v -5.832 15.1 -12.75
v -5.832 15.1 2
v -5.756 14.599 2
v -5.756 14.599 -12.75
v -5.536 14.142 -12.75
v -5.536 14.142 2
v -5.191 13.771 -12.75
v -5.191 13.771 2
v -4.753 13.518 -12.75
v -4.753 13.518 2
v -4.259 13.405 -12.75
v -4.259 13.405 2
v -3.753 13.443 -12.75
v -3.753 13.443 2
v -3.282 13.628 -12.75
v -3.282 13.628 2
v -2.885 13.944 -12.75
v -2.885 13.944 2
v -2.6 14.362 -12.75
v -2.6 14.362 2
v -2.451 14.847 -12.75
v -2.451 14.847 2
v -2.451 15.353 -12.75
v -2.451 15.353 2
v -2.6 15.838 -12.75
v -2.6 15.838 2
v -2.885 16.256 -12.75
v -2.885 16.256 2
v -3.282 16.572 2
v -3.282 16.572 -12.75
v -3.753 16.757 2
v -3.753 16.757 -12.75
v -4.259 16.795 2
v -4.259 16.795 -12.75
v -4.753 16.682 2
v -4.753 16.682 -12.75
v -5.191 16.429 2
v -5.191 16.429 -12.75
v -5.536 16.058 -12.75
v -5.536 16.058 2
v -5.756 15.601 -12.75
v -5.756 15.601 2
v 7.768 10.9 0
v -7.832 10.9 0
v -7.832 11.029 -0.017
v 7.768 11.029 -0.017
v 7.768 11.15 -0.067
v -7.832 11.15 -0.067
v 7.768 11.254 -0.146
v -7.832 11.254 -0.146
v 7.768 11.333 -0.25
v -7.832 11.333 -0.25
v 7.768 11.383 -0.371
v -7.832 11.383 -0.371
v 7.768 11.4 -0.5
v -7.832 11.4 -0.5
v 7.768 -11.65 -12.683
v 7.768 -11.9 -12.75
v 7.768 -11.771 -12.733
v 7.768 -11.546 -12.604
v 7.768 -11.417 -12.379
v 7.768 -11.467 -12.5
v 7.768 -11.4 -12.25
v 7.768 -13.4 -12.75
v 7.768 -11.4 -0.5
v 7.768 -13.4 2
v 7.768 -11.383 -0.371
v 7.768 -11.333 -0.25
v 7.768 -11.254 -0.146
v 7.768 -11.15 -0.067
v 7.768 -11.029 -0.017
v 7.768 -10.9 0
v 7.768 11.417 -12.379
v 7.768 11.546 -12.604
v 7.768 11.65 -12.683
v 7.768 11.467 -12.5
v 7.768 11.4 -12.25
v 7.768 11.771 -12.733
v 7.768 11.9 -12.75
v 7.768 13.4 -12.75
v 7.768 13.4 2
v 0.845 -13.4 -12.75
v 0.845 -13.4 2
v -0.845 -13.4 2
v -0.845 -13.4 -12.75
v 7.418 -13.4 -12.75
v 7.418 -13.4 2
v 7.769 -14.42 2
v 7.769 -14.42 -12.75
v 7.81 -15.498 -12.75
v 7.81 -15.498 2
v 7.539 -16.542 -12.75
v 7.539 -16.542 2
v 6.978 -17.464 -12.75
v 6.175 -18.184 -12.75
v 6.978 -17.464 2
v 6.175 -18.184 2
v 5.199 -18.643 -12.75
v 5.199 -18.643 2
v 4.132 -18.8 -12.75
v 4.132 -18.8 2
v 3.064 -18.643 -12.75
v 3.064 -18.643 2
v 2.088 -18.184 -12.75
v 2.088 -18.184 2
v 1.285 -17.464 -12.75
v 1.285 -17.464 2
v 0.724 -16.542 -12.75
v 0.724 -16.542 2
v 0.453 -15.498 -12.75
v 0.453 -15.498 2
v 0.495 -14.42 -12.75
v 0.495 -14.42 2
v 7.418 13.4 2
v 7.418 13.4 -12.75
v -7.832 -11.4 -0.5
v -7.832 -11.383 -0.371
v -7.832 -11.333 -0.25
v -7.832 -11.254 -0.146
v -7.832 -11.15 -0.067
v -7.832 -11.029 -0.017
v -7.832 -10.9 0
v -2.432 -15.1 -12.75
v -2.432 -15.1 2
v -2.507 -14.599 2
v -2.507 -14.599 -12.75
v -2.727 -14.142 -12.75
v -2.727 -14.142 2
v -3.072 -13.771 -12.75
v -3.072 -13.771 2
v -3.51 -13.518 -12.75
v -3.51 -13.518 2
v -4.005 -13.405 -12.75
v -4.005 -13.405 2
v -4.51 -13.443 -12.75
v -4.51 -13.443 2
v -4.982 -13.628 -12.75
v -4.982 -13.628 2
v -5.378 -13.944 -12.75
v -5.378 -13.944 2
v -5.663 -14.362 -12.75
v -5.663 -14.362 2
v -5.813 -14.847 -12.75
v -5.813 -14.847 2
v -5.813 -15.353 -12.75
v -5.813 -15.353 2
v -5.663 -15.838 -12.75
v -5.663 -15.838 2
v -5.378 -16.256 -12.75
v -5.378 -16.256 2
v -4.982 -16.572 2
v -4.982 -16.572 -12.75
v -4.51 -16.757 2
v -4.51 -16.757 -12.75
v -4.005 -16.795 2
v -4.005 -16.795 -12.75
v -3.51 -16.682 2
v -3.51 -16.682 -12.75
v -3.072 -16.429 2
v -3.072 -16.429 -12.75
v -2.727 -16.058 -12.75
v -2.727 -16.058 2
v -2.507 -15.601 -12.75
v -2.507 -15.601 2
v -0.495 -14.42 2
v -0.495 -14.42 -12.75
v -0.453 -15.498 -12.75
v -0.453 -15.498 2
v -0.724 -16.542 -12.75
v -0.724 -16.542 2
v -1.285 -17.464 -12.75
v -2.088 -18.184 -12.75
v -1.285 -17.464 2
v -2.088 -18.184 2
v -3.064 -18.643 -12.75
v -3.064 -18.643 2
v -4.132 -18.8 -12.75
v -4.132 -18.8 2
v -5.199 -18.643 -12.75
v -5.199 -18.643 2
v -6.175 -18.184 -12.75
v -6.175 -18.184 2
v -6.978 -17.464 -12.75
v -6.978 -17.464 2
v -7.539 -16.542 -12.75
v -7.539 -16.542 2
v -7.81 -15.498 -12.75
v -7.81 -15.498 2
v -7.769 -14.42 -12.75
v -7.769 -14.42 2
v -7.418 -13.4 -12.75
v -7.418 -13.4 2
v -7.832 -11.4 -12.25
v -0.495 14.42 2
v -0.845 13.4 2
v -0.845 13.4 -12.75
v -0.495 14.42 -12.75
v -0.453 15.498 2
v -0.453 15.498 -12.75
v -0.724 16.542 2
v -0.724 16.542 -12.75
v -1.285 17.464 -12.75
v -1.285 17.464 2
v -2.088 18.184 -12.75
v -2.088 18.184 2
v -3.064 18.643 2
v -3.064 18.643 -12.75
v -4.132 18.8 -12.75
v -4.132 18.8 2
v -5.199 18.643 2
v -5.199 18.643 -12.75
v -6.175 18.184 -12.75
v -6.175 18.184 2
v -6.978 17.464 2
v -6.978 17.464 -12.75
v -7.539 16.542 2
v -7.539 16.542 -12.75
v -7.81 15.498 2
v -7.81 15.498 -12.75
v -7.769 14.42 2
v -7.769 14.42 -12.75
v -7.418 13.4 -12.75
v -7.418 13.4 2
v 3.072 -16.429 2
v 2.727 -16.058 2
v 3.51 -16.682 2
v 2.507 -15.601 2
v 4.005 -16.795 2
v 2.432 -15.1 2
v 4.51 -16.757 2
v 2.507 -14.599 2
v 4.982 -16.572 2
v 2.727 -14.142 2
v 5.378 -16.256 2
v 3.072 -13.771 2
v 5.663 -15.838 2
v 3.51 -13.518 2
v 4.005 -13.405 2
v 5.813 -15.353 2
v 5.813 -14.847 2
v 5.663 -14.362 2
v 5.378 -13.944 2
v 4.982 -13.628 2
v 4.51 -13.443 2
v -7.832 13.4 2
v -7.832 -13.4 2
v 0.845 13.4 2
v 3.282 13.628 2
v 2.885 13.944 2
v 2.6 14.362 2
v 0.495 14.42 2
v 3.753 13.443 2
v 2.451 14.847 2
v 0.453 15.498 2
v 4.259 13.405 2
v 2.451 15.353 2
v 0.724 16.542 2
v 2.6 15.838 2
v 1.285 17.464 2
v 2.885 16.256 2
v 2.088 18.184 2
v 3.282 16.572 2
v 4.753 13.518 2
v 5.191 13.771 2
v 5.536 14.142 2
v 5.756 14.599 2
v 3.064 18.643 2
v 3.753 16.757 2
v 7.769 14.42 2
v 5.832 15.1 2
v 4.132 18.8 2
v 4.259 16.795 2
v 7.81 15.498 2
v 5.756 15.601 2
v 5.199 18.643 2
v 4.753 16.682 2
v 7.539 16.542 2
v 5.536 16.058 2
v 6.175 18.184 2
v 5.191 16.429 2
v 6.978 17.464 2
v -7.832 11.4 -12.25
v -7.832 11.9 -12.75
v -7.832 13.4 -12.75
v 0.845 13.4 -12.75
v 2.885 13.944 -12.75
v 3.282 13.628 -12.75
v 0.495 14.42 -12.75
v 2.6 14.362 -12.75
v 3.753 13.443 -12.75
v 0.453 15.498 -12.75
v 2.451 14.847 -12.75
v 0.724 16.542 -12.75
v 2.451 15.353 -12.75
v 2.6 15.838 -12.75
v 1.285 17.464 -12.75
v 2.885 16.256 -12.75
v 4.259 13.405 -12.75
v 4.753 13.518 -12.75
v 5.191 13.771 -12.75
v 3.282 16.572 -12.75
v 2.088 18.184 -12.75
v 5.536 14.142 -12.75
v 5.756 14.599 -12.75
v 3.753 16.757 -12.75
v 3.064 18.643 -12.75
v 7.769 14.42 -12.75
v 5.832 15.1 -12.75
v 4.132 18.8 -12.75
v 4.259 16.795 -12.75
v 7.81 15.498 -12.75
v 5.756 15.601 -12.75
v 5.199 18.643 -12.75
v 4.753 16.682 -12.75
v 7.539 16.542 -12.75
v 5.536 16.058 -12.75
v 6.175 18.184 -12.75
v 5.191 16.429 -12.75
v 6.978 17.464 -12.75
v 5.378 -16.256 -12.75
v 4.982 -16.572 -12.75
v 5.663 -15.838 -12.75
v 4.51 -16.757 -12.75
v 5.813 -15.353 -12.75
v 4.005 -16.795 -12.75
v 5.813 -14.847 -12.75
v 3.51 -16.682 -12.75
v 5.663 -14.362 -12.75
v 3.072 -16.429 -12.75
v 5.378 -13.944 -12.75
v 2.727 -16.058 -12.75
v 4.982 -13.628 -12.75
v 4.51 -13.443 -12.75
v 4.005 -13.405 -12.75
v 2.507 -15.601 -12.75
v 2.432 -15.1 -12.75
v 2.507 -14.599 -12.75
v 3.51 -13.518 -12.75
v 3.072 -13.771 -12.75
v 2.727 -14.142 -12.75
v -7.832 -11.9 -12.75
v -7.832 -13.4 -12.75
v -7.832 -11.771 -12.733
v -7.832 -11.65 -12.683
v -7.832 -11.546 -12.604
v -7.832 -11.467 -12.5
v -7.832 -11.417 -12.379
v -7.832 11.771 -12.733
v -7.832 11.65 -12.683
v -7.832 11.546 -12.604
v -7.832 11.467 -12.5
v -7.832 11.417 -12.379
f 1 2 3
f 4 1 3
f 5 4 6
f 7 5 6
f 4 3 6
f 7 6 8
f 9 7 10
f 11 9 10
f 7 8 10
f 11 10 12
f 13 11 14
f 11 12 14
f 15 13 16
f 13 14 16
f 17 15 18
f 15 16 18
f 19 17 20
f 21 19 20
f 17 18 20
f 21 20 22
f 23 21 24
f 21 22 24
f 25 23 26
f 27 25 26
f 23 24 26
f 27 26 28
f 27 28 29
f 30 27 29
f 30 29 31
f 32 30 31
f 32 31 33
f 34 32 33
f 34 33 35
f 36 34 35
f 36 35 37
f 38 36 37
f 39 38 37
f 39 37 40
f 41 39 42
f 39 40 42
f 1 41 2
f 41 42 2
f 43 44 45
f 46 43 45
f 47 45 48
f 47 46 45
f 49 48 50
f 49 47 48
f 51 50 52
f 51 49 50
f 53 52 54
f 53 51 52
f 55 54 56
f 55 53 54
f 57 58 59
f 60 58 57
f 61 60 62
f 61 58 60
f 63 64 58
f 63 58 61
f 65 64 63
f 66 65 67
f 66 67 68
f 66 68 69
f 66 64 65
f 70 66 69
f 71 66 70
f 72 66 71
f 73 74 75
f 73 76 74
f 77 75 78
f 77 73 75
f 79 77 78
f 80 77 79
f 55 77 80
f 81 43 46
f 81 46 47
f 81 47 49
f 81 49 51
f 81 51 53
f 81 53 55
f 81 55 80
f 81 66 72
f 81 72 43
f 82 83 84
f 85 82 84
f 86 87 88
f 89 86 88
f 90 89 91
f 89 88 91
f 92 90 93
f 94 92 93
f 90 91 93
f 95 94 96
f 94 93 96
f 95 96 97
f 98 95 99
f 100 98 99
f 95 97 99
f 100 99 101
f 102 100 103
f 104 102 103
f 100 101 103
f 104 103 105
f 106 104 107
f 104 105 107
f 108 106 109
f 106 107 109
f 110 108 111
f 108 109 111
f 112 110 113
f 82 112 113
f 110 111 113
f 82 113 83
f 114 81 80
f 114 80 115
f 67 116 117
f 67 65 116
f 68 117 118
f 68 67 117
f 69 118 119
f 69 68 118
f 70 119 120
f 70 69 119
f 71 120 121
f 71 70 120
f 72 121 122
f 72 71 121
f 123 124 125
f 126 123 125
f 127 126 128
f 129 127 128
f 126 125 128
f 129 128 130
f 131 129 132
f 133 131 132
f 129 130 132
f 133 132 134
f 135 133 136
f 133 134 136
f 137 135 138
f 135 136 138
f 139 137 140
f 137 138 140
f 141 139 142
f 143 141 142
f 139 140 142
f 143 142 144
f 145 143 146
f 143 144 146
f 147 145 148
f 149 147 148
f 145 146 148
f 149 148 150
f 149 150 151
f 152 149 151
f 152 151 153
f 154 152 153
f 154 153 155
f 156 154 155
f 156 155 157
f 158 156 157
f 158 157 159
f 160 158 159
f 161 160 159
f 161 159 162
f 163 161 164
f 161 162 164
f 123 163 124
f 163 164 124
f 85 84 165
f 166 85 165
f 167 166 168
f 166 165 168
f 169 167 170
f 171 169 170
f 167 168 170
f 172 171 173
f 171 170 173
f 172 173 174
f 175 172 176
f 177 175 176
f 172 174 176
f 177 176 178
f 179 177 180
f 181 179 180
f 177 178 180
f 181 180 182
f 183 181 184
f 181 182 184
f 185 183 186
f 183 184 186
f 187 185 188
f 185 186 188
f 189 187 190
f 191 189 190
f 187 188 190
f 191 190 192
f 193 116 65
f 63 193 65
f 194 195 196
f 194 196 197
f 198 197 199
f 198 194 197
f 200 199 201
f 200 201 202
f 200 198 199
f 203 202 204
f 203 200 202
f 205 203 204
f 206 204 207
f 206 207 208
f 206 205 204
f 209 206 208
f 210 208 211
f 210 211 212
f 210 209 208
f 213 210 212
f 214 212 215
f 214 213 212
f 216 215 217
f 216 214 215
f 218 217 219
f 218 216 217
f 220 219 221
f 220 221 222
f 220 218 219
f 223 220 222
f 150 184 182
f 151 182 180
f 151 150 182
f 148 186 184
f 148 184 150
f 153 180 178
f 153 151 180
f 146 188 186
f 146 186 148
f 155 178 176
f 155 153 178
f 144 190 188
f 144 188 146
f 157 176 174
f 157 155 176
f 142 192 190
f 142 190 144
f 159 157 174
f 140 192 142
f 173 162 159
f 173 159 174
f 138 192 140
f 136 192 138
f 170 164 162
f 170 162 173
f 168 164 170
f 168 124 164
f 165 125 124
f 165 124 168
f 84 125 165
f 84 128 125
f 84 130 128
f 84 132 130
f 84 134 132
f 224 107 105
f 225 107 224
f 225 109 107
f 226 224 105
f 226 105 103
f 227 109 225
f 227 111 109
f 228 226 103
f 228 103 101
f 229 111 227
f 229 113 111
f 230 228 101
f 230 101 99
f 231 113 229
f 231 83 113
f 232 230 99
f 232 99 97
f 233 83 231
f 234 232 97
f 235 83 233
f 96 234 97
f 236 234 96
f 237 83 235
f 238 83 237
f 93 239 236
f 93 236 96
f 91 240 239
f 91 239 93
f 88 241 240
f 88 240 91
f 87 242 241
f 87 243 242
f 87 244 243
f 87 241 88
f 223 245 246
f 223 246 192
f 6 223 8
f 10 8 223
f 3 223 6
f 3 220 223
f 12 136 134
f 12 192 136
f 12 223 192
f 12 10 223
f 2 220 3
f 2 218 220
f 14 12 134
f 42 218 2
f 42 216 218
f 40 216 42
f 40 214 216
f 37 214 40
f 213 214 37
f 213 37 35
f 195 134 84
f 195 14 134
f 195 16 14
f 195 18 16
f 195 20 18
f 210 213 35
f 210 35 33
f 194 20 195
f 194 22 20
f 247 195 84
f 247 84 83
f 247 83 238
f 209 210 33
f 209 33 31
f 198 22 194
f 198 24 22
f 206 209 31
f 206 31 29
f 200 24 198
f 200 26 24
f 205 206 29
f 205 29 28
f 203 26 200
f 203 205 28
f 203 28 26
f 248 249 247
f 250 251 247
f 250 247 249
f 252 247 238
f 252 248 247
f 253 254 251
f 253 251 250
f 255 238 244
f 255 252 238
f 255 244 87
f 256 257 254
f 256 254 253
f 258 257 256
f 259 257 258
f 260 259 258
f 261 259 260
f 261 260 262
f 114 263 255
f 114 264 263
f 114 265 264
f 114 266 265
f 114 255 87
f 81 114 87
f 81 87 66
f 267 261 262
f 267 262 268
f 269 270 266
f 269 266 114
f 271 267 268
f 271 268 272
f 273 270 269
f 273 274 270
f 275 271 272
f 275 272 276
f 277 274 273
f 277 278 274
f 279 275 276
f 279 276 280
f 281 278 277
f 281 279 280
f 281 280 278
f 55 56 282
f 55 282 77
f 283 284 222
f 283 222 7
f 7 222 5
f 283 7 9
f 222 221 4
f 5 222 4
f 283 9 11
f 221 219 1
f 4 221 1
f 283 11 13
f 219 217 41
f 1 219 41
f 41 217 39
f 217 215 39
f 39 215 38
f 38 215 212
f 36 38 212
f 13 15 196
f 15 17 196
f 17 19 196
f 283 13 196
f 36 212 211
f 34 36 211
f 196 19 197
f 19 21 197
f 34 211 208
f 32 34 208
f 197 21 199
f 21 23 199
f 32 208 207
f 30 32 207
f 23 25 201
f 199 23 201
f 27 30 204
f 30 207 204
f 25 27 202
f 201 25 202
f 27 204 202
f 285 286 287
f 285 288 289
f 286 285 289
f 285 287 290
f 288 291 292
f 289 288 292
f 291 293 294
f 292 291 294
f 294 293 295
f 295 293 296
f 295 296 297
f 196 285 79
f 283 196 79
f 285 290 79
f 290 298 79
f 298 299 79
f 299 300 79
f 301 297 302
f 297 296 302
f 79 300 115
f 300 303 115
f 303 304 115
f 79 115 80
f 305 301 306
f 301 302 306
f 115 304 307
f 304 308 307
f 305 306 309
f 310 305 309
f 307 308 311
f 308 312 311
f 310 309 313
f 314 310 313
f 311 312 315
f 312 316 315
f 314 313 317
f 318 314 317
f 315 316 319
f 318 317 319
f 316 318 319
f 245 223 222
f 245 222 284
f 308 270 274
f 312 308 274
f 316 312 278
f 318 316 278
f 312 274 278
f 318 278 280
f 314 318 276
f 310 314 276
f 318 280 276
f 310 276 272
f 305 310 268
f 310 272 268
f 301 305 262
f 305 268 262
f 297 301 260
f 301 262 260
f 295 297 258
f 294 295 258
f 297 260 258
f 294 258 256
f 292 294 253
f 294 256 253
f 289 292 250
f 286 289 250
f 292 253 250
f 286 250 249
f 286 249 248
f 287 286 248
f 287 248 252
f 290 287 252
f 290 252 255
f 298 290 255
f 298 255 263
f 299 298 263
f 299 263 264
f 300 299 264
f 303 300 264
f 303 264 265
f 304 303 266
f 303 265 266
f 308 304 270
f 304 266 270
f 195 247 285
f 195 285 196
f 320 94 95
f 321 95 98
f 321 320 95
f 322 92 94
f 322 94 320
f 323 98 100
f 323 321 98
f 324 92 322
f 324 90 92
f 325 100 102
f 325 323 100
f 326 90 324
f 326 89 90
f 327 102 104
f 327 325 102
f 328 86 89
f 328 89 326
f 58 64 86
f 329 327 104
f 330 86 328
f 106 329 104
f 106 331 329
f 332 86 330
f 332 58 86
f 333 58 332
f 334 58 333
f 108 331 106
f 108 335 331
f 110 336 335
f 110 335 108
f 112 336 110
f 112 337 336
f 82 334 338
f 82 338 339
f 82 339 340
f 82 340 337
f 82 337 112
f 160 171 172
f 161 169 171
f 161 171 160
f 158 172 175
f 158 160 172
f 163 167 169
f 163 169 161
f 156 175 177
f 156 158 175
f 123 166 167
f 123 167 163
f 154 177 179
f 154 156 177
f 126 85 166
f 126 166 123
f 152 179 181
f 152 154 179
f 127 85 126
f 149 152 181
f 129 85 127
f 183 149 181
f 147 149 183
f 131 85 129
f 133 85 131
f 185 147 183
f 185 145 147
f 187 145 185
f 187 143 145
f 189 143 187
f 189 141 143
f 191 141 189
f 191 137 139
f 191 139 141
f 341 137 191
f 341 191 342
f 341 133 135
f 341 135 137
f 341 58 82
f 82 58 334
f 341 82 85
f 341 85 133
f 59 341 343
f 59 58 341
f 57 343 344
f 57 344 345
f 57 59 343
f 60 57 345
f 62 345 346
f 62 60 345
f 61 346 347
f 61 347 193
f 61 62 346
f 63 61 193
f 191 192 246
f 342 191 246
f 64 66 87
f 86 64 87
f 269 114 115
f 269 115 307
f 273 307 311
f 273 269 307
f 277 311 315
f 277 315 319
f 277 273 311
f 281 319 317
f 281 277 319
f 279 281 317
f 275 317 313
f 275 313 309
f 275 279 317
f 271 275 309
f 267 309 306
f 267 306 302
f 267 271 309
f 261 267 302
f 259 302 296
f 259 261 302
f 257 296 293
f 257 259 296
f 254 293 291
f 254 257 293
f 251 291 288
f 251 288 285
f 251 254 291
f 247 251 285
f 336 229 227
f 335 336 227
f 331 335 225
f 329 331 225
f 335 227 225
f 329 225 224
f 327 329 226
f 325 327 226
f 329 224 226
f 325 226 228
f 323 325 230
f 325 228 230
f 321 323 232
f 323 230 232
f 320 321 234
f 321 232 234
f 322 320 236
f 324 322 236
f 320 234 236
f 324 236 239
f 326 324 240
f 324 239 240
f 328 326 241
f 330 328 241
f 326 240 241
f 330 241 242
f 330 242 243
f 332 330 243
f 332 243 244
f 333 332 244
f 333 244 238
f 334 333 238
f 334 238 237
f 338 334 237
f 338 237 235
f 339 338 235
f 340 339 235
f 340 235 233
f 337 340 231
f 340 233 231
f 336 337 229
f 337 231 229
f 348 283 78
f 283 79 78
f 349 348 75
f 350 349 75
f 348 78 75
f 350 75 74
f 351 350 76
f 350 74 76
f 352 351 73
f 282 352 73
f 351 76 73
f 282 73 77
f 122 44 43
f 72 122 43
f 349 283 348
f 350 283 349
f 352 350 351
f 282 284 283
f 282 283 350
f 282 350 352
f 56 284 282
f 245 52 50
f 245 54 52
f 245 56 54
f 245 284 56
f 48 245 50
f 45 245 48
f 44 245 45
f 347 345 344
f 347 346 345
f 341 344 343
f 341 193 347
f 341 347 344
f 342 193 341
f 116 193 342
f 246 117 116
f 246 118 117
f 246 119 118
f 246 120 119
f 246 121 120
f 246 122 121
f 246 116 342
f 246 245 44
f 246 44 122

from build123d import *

# Parameters (mm, degrees)
SCHIZZO1_W                   = 15.6
SCHIZZO1_H                   = 22.8
ESTRUSIONE_ESTRUSIONE1_DEPTH = 2
SCHIZZO7_R                   = 1.7
ESTRUSIONE_ESTRUSIONE8_DEPTH = 14.75
RACCORDO2_R                  = 0.5


with BuildPart() as part:
    # Schizzo1 → Estrusione-Estrusione1 (new body)
    with BuildSketch(Plane.XY):
        with Locations((-0.031567178, 0)):
            Rectangle(SCHIZZO1_W, SCHIZZO1_H)
    extrude(amount=ESTRUSIONE_ESTRUSIONE1_DEPTH)

    # Schizzo7 → Estrusione-Estrusione8 (add)
    # profile 1 of 2: a face of its own
    with BuildSketch(Plane.XY.offset(2)):
        with BuildLine():
            Line((7.768432822, 13.4), (7.417902523, 13.4))
            ThreePointArc((7.417902523, 13.4), (4.131567178, 18.8), (0.845231833, 13.4))
            Line((0.845231833, 13.4), (-0.845231833, 13.4))
            ThreePointArc((-0.845231833, 13.4), (-4.131567178, 18.8), (-7.417902523, 13.4))
            Line((-7.417902523, 13.4), (-7.831567178, 13.4))
            Line((-7.831567178, 13.4), (-7.831567178, 11.4))
            Line((-7.831567178, 11.4), (7.768432822, 11.4))
            Line((7.768432822, 11.4), (7.768432822, 13.4))
        make_face()
        with Locations((4.131567178, 15.1)):
            Circle(SCHIZZO7_R, mode=Mode.SUBTRACT)
        with Locations(Location((-4.131567178, 15.1, 0), (0, 0, 180))):
            Circle(SCHIZZO7_R, mode=Mode.SUBTRACT)
    # profile 2 of 2: a face of its own
    with BuildSketch(Plane.XY.offset(2)):
        with BuildLine():
            Line((0.845231833, -13.4), (-0.845231833, -13.4))
            ThreePointArc((-0.845231833, -13.4), (-4.131567178, -18.8), (-7.417902523, -13.4))
            Line((-7.417902523, -13.4), (-7.831567178, -13.4))
            Line((-7.831567178, -13.4), (-7.831567178, -11.4))
            Line((-7.831567178, -11.4), (7.768432822, -11.4))
            Line((7.768432822, -11.4), (7.768432822, -13.4))
            Line((7.768432822, -13.4), (7.417902523, -13.4))
            ThreePointArc((7.417902523, -13.4), (4.131567178, -18.8), (0.845231833, -13.4))
        make_face()
        with Locations((-4.131567178, -15.1)):
            Circle(SCHIZZO7_R, mode=Mode.SUBTRACT)
        with Locations(Location((4.131567178, -15.1, 0), (0, 0, 180))):
            Circle(SCHIZZO7_R, mode=Mode.SUBTRACT)
    extrude(amount=-ESTRUSIONE_ESTRUSIONE8_DEPTH)

    # Raccordo2
    raccordo2_edges = [part.edges().sort_by_distance(p)[0] for p in [
        (-0.031567178, 11.4, 0),
        (-0.031567178, 11.4, -12.75),
        (-0.031567178, -11.4, 0),
        (-0.031567178, -11.4, -12.75),
    ]]
    fillet(raccordo2_edges, radius=RACCORDO2_R)


solid = part.part
